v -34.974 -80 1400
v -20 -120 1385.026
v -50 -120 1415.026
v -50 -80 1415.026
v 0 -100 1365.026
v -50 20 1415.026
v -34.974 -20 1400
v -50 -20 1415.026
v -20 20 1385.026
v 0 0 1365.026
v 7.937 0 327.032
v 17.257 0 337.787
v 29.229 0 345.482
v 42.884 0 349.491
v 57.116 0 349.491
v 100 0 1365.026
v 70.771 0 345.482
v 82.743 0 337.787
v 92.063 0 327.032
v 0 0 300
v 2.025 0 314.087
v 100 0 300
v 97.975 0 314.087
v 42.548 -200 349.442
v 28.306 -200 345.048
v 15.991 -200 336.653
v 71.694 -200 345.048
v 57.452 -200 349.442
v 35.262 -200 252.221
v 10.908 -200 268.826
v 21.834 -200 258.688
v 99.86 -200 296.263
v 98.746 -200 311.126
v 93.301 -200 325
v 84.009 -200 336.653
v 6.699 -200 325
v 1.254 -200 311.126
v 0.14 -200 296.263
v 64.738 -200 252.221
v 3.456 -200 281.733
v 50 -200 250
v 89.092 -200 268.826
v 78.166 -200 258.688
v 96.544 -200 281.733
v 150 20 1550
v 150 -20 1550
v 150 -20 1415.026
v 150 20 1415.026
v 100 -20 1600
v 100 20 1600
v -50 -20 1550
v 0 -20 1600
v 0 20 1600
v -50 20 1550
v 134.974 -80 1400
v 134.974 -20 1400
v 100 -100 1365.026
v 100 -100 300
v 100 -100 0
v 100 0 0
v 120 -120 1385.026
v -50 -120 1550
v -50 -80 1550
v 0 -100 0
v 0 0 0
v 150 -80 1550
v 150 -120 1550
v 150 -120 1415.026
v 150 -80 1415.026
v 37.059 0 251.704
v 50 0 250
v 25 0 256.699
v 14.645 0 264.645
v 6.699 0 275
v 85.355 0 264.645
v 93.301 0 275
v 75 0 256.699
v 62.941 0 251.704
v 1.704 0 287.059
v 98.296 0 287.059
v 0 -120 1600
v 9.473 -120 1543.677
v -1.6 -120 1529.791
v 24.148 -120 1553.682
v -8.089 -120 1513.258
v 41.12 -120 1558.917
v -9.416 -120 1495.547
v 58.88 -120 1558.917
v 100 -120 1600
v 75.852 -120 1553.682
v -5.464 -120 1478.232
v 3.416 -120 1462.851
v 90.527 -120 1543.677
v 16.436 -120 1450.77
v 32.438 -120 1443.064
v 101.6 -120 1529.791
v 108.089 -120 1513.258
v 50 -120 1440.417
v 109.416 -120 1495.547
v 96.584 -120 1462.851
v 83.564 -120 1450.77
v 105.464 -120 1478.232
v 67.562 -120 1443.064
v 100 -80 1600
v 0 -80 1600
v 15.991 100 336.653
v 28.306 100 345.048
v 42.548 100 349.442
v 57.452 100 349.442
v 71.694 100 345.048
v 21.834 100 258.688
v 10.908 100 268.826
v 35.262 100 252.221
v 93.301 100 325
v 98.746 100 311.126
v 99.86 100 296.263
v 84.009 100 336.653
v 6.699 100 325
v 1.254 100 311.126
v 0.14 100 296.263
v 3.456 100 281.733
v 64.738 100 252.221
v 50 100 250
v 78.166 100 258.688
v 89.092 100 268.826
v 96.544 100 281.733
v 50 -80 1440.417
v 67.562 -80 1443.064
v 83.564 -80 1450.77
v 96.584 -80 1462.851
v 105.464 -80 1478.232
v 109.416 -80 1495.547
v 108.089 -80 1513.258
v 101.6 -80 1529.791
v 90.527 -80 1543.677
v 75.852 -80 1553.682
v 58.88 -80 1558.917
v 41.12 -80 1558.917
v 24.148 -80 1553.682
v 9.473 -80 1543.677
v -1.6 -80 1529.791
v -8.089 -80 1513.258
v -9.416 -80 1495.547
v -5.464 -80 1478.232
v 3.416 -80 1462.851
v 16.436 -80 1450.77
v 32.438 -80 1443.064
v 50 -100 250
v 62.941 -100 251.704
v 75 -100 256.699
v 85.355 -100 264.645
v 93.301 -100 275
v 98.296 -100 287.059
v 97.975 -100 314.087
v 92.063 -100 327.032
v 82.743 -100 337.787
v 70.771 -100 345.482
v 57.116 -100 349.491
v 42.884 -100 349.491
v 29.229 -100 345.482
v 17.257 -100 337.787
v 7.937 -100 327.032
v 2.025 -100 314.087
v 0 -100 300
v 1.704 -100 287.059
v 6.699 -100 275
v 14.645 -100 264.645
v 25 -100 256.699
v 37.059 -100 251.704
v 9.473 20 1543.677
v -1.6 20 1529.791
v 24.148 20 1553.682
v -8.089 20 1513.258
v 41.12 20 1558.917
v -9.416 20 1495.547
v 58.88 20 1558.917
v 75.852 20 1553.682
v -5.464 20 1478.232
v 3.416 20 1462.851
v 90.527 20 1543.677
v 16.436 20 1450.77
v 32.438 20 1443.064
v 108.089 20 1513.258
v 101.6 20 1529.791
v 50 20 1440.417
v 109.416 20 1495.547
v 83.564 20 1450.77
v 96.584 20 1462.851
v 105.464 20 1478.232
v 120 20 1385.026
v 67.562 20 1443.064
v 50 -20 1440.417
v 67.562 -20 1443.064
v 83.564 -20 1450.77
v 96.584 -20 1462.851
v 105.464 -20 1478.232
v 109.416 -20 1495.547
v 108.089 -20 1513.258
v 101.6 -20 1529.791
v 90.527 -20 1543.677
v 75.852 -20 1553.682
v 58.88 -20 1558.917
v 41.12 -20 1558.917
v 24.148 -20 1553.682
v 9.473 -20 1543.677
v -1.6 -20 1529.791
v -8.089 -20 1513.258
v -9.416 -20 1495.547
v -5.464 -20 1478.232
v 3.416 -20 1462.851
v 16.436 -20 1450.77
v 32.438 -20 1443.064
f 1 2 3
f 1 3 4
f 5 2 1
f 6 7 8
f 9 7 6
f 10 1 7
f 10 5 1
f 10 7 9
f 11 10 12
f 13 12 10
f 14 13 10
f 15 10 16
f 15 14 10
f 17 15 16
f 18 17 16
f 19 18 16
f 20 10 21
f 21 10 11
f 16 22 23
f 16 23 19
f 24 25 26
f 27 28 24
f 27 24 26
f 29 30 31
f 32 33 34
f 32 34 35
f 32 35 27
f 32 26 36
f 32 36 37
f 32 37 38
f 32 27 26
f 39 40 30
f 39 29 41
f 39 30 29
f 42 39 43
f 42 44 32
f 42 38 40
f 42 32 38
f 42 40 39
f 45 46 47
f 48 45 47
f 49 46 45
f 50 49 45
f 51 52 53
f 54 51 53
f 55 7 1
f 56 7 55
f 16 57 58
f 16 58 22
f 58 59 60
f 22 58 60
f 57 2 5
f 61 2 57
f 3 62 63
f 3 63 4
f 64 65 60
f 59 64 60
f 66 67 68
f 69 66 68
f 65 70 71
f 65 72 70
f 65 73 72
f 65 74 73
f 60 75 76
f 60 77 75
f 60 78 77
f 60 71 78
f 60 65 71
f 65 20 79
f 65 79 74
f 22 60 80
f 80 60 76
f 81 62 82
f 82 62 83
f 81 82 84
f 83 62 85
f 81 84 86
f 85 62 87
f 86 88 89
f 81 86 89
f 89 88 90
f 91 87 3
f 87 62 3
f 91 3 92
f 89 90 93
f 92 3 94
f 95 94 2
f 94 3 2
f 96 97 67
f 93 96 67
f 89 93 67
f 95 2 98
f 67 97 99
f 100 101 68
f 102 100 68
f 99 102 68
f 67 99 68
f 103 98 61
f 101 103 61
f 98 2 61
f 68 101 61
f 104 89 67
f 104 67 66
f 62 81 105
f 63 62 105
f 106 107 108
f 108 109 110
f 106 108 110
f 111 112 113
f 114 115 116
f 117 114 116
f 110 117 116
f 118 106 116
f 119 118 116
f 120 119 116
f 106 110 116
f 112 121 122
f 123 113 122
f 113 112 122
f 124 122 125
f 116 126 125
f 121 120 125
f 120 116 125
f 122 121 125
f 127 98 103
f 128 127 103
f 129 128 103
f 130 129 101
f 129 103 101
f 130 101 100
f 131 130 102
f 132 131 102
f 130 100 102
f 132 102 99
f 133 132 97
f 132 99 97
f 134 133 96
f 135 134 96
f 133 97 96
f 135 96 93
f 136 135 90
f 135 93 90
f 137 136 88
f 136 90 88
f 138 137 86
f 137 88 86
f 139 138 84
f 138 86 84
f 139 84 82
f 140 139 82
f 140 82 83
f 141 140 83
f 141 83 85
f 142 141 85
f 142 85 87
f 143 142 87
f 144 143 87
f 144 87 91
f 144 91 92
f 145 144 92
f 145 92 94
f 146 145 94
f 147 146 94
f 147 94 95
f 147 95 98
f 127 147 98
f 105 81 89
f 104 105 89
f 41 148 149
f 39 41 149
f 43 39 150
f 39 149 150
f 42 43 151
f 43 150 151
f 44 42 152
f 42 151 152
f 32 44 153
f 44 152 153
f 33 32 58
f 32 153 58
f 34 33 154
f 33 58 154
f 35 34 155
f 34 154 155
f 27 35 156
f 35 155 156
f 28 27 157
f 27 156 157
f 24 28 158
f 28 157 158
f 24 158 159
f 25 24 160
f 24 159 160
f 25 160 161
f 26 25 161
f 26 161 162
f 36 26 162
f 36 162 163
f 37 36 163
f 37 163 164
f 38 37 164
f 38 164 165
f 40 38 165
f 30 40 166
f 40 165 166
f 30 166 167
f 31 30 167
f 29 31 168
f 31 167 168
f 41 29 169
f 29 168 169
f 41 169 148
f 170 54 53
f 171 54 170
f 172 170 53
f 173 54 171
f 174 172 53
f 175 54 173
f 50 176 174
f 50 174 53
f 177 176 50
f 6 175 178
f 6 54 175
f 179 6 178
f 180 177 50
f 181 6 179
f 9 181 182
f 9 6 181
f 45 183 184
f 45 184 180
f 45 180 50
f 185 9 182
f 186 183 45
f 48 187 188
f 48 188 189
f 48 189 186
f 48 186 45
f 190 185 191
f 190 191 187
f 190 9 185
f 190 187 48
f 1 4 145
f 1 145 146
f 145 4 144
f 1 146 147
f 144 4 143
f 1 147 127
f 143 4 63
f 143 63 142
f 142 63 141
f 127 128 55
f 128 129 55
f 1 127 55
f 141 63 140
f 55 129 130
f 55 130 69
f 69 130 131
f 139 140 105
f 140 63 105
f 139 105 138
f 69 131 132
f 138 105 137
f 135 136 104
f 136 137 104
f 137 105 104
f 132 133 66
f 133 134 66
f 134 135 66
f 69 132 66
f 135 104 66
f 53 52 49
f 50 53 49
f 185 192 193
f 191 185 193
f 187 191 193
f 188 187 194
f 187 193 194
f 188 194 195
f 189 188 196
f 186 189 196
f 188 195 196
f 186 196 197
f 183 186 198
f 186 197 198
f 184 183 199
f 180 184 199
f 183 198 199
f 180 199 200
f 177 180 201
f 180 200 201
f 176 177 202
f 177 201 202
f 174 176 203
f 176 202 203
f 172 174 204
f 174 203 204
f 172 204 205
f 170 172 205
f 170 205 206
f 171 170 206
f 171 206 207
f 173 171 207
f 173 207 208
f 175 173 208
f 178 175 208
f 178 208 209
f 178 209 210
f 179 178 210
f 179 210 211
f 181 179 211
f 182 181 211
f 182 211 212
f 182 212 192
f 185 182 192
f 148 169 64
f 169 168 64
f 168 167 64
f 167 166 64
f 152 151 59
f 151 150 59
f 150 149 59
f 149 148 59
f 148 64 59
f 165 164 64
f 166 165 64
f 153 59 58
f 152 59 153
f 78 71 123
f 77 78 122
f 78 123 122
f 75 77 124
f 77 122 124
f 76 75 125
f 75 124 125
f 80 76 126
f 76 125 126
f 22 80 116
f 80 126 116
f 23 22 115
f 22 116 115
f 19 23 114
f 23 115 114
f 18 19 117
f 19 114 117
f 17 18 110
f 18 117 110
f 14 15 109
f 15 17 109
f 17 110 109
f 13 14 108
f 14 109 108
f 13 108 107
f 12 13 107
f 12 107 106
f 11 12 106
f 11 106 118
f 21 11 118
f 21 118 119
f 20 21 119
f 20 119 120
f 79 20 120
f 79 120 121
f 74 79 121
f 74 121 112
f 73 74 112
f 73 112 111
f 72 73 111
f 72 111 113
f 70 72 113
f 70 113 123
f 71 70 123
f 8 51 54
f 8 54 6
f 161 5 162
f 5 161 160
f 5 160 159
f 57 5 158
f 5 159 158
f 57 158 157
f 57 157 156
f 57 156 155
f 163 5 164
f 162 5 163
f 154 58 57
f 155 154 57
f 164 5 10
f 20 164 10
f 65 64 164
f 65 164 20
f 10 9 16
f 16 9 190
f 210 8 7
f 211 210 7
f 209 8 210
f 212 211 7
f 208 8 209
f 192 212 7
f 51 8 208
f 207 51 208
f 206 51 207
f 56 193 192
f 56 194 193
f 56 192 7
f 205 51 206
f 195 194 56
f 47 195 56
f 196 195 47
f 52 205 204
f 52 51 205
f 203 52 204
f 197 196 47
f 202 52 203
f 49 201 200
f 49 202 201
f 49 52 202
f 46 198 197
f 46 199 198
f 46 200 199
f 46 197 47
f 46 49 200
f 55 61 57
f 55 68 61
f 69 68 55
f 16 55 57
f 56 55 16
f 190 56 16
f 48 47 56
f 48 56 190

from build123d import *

# Parameters (mm, degrees)
SKETCH1_W                = 100
SKETCH1_H                = 100
BOSS_EXTRUDE1_DEPTH      = 1600
BOSS_EXTRUDE2_DEPTH      = 100
BOSS_EXTRUDE2_DEPTH_BACK = 200
SKETCH2_R                = 50
BOSS_EXTRUDE3_DEPTH      = 20
BOSS_EXTRUDE3_DEPTH_BACK = 120
SKETCH4_W                = 200
SKETCH4_H                = 234.974329415
CHAMFER1_SIZE            = 20
CHAMFER2_SIZE            = 50
SKETCH5_R                = 59.582841924
CUT_EXTRUDE2_DEPTH       = 560
SKETCH6_W                = 449.686922891
SKETCH6_H                = 60
CUT_EXTRUDE3_DEPTH       = 200


with BuildPart() as part:
    # Sketch1 → Boss-Extrude1 (new body)
    with BuildSketch(Plane.XY):
        with Locations((50, -50)):
            Rectangle(SKETCH1_W, SKETCH1_H)
    extrude(amount=BOSS_EXTRUDE1_DEPTH)

    # Sketch2 → Boss-Extrude2 (add, two sides: drawn at the far end of the back side and taken through both)
    with BuildSketch(Plane.XZ.offset(100).offset(-BOSS_EXTRUDE2_DEPTH_BACK)):
        with Locations(Location((50, 300, 0), (0, 0, 270))):
            Circle(SKETCH2_R)
    extrude(amount=BOSS_EXTRUDE2_DEPTH + BOSS_EXTRUDE2_DEPTH_BACK)

    # Sketch4 → Boss-Extrude3 (add, two sides: drawn at the far end of the back side and taken through both)
    with BuildSketch(Plane(origin=(0, 0, 0), x_dir=(1, 0, 0), z_dir=(0, 1, 0)).offset(-BOSS_EXTRUDE3_DEPTH_BACK)):
        with Locations((50, -1482.512835293)):
            Rectangle(SKETCH4_W, SKETCH4_H)
    extrude(amount=BOSS_EXTRUDE3_DEPTH + BOSS_EXTRUDE3_DEPTH_BACK)

    # Chamfer1
    chamfer1_edges = [part.edges().sort_by_distance(p)[0] for p in [
        (50, -120, 1365.025670585),
        (50, 20, 1365.025670585),
    ]]
    chamfer(chamfer1_edges, length=CHAMFER1_SIZE - 0.0001)  # a hair under: the kernel refuses the full size

    # Chamfer2
    chamfer2_edges = [part.edges().sort_by_distance(p)[0] for p in [
        (150, -50, 1365.025670585),
        (-50, -50, 1365.025670585),
        (150, -50, 1600),
        (-50, -50, 1600),
    ]]
    chamfer(chamfer2_edges, length=CHAMFER2_SIZE - 0.0001)  # a hair under: the kernel refuses the full size

    # Sketch5 → Cut-Extrude2 (cut)
    with BuildSketch(Plane.XZ.offset(120)):
        with Locations(Location((50, 1500, 0), (0, 0, 270))):
            Circle(SKETCH5_R)
    extrude(amount=-CUT_EXTRUDE2_DEPTH, mode=Mode.SUBTRACT)

    # Sketch6 → Cut-Extrude3 (cut)
    with BuildSketch(Plane.XY.offset(1600)):
        with Locations((52.387718175, -50)):
            Rectangle(SKETCH6_W, SKETCH6_H)
    extrude(amount=-CUT_EXTRUDE3_DEPTH, mode=Mode.SUBTRACT)


solid = part.part
